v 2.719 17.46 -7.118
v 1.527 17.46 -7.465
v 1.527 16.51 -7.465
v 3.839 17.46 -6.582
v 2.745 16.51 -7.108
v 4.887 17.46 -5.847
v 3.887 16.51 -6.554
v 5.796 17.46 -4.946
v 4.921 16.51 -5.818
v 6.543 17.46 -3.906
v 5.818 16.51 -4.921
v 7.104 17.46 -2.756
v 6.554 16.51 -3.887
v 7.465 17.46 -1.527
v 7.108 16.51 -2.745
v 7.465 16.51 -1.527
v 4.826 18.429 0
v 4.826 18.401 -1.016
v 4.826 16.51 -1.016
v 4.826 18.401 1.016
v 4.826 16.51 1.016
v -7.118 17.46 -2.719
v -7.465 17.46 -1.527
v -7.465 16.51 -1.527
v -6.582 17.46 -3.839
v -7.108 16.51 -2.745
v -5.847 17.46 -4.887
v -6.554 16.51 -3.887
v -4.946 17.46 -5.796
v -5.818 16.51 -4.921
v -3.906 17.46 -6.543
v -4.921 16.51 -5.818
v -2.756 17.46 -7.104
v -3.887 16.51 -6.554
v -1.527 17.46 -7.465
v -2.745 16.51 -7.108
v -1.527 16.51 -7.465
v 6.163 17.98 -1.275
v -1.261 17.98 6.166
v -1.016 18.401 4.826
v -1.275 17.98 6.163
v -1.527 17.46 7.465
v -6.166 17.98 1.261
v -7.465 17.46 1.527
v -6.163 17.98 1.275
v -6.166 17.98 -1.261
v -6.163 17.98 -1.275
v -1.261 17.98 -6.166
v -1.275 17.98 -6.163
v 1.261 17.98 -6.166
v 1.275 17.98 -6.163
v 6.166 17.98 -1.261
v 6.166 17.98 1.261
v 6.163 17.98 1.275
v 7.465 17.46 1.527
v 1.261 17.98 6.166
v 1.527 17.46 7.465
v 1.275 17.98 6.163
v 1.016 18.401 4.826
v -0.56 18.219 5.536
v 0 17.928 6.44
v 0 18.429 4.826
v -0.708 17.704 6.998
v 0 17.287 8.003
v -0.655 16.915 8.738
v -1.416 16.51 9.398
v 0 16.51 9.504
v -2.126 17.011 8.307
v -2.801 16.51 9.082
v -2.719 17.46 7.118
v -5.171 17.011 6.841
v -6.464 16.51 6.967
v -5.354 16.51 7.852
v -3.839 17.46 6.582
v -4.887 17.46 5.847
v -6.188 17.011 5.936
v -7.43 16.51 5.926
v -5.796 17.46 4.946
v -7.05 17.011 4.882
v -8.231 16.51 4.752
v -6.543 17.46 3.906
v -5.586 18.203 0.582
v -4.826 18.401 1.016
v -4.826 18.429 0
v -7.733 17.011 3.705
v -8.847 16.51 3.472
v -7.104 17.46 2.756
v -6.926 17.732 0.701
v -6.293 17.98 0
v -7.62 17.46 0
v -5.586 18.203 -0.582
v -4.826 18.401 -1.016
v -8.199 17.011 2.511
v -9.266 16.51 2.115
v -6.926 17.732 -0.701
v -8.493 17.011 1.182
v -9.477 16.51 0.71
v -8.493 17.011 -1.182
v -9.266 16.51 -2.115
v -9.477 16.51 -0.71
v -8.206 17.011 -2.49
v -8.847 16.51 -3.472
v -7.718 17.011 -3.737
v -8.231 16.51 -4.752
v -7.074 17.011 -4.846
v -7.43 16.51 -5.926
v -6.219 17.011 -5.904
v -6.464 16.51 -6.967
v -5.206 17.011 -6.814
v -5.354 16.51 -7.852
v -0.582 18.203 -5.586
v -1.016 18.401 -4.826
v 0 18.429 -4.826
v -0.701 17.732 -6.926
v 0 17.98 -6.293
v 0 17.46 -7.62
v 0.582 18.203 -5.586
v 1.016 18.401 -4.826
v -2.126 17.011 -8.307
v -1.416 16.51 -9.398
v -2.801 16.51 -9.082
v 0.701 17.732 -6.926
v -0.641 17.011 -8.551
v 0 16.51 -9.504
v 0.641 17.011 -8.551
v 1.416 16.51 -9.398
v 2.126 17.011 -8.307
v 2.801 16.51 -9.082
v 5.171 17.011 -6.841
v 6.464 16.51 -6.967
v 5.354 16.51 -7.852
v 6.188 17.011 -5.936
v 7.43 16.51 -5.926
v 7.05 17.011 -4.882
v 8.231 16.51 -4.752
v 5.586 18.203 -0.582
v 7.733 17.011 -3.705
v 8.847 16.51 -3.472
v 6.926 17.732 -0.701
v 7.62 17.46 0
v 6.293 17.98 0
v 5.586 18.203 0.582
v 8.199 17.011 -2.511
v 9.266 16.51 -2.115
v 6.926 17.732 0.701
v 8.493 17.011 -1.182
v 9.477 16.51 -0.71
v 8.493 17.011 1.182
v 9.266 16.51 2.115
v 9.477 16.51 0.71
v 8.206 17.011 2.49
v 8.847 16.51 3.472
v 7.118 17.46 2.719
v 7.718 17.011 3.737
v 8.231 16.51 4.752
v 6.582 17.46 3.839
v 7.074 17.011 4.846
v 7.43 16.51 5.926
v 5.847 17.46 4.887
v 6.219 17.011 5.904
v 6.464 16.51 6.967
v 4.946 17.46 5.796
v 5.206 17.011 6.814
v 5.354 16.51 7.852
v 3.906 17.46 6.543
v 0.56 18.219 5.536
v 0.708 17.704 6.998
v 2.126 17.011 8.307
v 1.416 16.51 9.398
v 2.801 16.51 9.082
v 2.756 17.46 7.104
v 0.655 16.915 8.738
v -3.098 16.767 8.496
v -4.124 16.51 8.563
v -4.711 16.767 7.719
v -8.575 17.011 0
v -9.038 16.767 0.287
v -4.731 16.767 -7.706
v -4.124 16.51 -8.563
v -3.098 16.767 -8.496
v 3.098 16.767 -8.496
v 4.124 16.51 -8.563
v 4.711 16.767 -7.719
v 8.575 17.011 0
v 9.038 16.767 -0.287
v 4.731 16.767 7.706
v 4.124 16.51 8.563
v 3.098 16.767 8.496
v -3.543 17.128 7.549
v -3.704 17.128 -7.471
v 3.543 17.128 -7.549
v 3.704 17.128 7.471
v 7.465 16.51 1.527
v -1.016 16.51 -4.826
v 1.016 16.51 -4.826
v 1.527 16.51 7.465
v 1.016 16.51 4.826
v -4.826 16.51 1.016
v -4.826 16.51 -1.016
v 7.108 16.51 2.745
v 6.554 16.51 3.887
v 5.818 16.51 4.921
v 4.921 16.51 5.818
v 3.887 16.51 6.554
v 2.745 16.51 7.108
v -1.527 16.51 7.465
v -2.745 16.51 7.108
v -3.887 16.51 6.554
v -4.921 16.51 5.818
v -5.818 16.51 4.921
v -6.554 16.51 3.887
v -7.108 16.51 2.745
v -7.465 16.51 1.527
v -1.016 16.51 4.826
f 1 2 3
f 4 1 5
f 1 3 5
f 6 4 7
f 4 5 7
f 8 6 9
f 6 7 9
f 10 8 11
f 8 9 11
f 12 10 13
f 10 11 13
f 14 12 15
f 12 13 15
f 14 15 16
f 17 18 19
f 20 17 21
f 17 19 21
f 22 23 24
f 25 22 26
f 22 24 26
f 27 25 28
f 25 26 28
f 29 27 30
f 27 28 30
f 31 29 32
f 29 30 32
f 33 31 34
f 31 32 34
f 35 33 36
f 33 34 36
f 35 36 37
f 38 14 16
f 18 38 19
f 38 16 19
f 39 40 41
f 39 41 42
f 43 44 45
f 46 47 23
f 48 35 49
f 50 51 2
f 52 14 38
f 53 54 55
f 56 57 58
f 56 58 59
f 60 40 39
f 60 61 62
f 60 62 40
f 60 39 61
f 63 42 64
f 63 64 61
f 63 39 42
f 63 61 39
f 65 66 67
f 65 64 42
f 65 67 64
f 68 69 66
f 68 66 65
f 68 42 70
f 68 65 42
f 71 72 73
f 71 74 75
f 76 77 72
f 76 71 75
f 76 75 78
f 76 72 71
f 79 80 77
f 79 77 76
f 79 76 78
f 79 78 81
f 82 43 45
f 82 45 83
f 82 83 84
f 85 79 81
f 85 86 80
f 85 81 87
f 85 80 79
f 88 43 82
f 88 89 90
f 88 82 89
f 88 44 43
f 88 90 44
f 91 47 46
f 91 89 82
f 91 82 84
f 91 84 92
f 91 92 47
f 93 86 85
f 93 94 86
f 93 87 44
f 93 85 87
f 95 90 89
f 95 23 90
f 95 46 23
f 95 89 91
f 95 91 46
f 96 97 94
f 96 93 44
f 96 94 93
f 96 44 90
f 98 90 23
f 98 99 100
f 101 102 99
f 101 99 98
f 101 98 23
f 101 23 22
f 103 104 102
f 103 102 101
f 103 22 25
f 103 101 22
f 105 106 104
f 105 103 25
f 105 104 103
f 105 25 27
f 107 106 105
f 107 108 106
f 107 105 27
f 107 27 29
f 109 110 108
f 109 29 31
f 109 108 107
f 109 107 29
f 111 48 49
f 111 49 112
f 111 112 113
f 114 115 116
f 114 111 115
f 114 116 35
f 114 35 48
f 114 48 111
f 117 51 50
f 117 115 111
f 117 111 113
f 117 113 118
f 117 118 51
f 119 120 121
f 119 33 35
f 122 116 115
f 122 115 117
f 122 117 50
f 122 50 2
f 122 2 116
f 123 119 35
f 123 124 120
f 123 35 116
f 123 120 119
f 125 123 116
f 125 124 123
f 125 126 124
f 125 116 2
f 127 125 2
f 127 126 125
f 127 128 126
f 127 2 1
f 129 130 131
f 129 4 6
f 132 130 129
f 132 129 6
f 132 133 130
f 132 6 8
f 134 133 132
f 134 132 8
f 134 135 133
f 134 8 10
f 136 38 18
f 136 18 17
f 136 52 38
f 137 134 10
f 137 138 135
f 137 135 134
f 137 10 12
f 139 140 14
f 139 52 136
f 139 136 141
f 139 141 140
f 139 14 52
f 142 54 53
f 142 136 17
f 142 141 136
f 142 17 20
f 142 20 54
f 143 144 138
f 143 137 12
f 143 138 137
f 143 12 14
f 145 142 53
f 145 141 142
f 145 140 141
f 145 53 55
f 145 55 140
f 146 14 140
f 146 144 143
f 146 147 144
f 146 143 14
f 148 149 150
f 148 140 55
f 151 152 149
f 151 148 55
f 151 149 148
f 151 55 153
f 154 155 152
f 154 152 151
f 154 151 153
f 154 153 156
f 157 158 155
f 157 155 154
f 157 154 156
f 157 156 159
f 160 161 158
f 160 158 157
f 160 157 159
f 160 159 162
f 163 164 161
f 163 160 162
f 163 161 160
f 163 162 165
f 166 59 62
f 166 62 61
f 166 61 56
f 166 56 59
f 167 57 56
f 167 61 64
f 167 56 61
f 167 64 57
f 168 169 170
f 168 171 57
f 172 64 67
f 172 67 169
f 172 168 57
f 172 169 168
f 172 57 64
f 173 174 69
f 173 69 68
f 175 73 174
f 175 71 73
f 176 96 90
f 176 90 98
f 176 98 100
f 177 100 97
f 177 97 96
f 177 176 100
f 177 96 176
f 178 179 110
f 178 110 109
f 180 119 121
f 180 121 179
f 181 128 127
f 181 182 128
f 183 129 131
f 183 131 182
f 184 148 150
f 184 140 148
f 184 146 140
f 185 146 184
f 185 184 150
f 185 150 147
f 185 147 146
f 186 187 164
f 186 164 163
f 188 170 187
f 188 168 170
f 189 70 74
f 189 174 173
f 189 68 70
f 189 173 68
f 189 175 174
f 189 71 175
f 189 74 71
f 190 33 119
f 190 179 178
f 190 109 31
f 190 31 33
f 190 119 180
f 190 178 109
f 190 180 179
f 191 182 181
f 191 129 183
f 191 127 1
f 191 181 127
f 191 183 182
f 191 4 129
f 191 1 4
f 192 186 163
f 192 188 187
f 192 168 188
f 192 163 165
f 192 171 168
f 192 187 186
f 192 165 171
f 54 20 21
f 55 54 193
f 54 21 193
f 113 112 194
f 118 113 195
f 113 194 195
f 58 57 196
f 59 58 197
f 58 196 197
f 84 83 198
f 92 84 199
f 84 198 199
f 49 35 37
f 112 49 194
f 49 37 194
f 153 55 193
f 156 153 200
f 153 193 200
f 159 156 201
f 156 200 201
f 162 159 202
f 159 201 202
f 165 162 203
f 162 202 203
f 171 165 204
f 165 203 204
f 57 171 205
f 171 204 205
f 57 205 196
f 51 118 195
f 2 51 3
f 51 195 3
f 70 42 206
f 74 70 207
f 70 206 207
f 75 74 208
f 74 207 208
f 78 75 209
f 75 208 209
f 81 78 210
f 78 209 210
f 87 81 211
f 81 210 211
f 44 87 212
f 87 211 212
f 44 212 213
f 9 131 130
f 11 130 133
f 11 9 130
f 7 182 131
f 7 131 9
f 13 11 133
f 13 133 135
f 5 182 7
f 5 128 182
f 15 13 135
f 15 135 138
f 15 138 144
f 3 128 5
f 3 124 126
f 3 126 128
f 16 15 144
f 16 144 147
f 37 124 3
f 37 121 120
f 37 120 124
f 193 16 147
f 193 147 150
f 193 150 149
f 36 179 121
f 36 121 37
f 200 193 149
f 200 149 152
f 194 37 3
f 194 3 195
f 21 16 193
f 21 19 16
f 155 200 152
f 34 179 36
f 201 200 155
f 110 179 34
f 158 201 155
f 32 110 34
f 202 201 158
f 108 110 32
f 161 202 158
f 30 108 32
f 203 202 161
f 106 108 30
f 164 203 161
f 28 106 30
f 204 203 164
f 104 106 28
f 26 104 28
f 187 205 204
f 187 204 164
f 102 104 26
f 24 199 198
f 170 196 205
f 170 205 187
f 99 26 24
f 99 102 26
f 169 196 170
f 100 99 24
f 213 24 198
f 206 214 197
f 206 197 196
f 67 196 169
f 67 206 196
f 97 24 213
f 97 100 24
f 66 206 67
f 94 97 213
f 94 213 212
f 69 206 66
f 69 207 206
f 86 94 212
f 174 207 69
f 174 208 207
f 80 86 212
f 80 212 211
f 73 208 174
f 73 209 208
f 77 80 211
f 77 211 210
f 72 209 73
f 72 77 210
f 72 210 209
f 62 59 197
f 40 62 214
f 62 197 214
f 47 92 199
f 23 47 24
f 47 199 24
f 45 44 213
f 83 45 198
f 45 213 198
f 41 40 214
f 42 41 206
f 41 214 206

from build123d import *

# Parameters (mm, degrees)
F3_DEPTH = 2.541


with BuildPart() as f1:
    # F0 (on Right) → F1 (revolve)
    with BuildSketch(Plane.YZ):
        with BuildLine():
            Line((16.51, 0), (19.05, 0))
            ThreePointArc((19.05, 0), (18.404048, 4.918689), (16.51, 9.50381))
            Line((16.51, 9.50381), (16.51, 0))
        make_face()
    revolve(axis=Axis((0, 17.78, 0), (0, -1, 0)))

    # F2 (on face) → F3 (cut, through all)
    with BuildSketch(Plane.XZ.offset(-16.51)):
        with BuildLine():
            Line((1.016, -4.826), (1.527208, -7.465389))
            ThreePointArc((1.527208, -7.465389), (5.388154, -5.388154), (7.465389, -1.527208))
            Line((7.465389, -1.527208), (4.826, -1.016))
            Line((4.826, -1.016), (4.826, 0))
            Line((4.826, 0), (4.826, 1.016))
            Line((4.826, 1.016), (7.465389, 1.527208))
            ThreePointArc((7.465389, 1.527208), (5.388154, 5.388154), (1.527208, 7.465389))
            Line((1.527208, 7.465389), (1.016, 4.826))
            Line((1.016, 4.826), (0, 4.826))
            Line((0, 4.826), (-1.016, 4.826))
            Line((-1.016, 4.826), (-1.527208, 7.465389))
            ThreePointArc((-1.527208, 7.465389), (-5.388154, 5.388154), (-7.465389, 1.527208))
            Line((-7.465389, 1.527208), (-4.826, 1.016))
            Line((-4.826, 1.016), (-4.826, 0))
            Line((-4.826, 0), (-4.826, -1.016))
            Line((-4.826, -1.016), (-7.465389, -1.527208))
            ThreePointArc((-7.465389, -1.527208), (-5.388154, -5.388154), (-1.527208, -7.465389))
            Line((-1.527208, -7.465389), (-1.016, -4.826))
            Line((-1.016, -4.826), (0, -4.826))
            Line((0, -4.826), (1.016, -4.826))
        make_face()
    extrude(amount=-F3_DEPTH, mode=Mode.SUBTRACT)


solid = f1.part
